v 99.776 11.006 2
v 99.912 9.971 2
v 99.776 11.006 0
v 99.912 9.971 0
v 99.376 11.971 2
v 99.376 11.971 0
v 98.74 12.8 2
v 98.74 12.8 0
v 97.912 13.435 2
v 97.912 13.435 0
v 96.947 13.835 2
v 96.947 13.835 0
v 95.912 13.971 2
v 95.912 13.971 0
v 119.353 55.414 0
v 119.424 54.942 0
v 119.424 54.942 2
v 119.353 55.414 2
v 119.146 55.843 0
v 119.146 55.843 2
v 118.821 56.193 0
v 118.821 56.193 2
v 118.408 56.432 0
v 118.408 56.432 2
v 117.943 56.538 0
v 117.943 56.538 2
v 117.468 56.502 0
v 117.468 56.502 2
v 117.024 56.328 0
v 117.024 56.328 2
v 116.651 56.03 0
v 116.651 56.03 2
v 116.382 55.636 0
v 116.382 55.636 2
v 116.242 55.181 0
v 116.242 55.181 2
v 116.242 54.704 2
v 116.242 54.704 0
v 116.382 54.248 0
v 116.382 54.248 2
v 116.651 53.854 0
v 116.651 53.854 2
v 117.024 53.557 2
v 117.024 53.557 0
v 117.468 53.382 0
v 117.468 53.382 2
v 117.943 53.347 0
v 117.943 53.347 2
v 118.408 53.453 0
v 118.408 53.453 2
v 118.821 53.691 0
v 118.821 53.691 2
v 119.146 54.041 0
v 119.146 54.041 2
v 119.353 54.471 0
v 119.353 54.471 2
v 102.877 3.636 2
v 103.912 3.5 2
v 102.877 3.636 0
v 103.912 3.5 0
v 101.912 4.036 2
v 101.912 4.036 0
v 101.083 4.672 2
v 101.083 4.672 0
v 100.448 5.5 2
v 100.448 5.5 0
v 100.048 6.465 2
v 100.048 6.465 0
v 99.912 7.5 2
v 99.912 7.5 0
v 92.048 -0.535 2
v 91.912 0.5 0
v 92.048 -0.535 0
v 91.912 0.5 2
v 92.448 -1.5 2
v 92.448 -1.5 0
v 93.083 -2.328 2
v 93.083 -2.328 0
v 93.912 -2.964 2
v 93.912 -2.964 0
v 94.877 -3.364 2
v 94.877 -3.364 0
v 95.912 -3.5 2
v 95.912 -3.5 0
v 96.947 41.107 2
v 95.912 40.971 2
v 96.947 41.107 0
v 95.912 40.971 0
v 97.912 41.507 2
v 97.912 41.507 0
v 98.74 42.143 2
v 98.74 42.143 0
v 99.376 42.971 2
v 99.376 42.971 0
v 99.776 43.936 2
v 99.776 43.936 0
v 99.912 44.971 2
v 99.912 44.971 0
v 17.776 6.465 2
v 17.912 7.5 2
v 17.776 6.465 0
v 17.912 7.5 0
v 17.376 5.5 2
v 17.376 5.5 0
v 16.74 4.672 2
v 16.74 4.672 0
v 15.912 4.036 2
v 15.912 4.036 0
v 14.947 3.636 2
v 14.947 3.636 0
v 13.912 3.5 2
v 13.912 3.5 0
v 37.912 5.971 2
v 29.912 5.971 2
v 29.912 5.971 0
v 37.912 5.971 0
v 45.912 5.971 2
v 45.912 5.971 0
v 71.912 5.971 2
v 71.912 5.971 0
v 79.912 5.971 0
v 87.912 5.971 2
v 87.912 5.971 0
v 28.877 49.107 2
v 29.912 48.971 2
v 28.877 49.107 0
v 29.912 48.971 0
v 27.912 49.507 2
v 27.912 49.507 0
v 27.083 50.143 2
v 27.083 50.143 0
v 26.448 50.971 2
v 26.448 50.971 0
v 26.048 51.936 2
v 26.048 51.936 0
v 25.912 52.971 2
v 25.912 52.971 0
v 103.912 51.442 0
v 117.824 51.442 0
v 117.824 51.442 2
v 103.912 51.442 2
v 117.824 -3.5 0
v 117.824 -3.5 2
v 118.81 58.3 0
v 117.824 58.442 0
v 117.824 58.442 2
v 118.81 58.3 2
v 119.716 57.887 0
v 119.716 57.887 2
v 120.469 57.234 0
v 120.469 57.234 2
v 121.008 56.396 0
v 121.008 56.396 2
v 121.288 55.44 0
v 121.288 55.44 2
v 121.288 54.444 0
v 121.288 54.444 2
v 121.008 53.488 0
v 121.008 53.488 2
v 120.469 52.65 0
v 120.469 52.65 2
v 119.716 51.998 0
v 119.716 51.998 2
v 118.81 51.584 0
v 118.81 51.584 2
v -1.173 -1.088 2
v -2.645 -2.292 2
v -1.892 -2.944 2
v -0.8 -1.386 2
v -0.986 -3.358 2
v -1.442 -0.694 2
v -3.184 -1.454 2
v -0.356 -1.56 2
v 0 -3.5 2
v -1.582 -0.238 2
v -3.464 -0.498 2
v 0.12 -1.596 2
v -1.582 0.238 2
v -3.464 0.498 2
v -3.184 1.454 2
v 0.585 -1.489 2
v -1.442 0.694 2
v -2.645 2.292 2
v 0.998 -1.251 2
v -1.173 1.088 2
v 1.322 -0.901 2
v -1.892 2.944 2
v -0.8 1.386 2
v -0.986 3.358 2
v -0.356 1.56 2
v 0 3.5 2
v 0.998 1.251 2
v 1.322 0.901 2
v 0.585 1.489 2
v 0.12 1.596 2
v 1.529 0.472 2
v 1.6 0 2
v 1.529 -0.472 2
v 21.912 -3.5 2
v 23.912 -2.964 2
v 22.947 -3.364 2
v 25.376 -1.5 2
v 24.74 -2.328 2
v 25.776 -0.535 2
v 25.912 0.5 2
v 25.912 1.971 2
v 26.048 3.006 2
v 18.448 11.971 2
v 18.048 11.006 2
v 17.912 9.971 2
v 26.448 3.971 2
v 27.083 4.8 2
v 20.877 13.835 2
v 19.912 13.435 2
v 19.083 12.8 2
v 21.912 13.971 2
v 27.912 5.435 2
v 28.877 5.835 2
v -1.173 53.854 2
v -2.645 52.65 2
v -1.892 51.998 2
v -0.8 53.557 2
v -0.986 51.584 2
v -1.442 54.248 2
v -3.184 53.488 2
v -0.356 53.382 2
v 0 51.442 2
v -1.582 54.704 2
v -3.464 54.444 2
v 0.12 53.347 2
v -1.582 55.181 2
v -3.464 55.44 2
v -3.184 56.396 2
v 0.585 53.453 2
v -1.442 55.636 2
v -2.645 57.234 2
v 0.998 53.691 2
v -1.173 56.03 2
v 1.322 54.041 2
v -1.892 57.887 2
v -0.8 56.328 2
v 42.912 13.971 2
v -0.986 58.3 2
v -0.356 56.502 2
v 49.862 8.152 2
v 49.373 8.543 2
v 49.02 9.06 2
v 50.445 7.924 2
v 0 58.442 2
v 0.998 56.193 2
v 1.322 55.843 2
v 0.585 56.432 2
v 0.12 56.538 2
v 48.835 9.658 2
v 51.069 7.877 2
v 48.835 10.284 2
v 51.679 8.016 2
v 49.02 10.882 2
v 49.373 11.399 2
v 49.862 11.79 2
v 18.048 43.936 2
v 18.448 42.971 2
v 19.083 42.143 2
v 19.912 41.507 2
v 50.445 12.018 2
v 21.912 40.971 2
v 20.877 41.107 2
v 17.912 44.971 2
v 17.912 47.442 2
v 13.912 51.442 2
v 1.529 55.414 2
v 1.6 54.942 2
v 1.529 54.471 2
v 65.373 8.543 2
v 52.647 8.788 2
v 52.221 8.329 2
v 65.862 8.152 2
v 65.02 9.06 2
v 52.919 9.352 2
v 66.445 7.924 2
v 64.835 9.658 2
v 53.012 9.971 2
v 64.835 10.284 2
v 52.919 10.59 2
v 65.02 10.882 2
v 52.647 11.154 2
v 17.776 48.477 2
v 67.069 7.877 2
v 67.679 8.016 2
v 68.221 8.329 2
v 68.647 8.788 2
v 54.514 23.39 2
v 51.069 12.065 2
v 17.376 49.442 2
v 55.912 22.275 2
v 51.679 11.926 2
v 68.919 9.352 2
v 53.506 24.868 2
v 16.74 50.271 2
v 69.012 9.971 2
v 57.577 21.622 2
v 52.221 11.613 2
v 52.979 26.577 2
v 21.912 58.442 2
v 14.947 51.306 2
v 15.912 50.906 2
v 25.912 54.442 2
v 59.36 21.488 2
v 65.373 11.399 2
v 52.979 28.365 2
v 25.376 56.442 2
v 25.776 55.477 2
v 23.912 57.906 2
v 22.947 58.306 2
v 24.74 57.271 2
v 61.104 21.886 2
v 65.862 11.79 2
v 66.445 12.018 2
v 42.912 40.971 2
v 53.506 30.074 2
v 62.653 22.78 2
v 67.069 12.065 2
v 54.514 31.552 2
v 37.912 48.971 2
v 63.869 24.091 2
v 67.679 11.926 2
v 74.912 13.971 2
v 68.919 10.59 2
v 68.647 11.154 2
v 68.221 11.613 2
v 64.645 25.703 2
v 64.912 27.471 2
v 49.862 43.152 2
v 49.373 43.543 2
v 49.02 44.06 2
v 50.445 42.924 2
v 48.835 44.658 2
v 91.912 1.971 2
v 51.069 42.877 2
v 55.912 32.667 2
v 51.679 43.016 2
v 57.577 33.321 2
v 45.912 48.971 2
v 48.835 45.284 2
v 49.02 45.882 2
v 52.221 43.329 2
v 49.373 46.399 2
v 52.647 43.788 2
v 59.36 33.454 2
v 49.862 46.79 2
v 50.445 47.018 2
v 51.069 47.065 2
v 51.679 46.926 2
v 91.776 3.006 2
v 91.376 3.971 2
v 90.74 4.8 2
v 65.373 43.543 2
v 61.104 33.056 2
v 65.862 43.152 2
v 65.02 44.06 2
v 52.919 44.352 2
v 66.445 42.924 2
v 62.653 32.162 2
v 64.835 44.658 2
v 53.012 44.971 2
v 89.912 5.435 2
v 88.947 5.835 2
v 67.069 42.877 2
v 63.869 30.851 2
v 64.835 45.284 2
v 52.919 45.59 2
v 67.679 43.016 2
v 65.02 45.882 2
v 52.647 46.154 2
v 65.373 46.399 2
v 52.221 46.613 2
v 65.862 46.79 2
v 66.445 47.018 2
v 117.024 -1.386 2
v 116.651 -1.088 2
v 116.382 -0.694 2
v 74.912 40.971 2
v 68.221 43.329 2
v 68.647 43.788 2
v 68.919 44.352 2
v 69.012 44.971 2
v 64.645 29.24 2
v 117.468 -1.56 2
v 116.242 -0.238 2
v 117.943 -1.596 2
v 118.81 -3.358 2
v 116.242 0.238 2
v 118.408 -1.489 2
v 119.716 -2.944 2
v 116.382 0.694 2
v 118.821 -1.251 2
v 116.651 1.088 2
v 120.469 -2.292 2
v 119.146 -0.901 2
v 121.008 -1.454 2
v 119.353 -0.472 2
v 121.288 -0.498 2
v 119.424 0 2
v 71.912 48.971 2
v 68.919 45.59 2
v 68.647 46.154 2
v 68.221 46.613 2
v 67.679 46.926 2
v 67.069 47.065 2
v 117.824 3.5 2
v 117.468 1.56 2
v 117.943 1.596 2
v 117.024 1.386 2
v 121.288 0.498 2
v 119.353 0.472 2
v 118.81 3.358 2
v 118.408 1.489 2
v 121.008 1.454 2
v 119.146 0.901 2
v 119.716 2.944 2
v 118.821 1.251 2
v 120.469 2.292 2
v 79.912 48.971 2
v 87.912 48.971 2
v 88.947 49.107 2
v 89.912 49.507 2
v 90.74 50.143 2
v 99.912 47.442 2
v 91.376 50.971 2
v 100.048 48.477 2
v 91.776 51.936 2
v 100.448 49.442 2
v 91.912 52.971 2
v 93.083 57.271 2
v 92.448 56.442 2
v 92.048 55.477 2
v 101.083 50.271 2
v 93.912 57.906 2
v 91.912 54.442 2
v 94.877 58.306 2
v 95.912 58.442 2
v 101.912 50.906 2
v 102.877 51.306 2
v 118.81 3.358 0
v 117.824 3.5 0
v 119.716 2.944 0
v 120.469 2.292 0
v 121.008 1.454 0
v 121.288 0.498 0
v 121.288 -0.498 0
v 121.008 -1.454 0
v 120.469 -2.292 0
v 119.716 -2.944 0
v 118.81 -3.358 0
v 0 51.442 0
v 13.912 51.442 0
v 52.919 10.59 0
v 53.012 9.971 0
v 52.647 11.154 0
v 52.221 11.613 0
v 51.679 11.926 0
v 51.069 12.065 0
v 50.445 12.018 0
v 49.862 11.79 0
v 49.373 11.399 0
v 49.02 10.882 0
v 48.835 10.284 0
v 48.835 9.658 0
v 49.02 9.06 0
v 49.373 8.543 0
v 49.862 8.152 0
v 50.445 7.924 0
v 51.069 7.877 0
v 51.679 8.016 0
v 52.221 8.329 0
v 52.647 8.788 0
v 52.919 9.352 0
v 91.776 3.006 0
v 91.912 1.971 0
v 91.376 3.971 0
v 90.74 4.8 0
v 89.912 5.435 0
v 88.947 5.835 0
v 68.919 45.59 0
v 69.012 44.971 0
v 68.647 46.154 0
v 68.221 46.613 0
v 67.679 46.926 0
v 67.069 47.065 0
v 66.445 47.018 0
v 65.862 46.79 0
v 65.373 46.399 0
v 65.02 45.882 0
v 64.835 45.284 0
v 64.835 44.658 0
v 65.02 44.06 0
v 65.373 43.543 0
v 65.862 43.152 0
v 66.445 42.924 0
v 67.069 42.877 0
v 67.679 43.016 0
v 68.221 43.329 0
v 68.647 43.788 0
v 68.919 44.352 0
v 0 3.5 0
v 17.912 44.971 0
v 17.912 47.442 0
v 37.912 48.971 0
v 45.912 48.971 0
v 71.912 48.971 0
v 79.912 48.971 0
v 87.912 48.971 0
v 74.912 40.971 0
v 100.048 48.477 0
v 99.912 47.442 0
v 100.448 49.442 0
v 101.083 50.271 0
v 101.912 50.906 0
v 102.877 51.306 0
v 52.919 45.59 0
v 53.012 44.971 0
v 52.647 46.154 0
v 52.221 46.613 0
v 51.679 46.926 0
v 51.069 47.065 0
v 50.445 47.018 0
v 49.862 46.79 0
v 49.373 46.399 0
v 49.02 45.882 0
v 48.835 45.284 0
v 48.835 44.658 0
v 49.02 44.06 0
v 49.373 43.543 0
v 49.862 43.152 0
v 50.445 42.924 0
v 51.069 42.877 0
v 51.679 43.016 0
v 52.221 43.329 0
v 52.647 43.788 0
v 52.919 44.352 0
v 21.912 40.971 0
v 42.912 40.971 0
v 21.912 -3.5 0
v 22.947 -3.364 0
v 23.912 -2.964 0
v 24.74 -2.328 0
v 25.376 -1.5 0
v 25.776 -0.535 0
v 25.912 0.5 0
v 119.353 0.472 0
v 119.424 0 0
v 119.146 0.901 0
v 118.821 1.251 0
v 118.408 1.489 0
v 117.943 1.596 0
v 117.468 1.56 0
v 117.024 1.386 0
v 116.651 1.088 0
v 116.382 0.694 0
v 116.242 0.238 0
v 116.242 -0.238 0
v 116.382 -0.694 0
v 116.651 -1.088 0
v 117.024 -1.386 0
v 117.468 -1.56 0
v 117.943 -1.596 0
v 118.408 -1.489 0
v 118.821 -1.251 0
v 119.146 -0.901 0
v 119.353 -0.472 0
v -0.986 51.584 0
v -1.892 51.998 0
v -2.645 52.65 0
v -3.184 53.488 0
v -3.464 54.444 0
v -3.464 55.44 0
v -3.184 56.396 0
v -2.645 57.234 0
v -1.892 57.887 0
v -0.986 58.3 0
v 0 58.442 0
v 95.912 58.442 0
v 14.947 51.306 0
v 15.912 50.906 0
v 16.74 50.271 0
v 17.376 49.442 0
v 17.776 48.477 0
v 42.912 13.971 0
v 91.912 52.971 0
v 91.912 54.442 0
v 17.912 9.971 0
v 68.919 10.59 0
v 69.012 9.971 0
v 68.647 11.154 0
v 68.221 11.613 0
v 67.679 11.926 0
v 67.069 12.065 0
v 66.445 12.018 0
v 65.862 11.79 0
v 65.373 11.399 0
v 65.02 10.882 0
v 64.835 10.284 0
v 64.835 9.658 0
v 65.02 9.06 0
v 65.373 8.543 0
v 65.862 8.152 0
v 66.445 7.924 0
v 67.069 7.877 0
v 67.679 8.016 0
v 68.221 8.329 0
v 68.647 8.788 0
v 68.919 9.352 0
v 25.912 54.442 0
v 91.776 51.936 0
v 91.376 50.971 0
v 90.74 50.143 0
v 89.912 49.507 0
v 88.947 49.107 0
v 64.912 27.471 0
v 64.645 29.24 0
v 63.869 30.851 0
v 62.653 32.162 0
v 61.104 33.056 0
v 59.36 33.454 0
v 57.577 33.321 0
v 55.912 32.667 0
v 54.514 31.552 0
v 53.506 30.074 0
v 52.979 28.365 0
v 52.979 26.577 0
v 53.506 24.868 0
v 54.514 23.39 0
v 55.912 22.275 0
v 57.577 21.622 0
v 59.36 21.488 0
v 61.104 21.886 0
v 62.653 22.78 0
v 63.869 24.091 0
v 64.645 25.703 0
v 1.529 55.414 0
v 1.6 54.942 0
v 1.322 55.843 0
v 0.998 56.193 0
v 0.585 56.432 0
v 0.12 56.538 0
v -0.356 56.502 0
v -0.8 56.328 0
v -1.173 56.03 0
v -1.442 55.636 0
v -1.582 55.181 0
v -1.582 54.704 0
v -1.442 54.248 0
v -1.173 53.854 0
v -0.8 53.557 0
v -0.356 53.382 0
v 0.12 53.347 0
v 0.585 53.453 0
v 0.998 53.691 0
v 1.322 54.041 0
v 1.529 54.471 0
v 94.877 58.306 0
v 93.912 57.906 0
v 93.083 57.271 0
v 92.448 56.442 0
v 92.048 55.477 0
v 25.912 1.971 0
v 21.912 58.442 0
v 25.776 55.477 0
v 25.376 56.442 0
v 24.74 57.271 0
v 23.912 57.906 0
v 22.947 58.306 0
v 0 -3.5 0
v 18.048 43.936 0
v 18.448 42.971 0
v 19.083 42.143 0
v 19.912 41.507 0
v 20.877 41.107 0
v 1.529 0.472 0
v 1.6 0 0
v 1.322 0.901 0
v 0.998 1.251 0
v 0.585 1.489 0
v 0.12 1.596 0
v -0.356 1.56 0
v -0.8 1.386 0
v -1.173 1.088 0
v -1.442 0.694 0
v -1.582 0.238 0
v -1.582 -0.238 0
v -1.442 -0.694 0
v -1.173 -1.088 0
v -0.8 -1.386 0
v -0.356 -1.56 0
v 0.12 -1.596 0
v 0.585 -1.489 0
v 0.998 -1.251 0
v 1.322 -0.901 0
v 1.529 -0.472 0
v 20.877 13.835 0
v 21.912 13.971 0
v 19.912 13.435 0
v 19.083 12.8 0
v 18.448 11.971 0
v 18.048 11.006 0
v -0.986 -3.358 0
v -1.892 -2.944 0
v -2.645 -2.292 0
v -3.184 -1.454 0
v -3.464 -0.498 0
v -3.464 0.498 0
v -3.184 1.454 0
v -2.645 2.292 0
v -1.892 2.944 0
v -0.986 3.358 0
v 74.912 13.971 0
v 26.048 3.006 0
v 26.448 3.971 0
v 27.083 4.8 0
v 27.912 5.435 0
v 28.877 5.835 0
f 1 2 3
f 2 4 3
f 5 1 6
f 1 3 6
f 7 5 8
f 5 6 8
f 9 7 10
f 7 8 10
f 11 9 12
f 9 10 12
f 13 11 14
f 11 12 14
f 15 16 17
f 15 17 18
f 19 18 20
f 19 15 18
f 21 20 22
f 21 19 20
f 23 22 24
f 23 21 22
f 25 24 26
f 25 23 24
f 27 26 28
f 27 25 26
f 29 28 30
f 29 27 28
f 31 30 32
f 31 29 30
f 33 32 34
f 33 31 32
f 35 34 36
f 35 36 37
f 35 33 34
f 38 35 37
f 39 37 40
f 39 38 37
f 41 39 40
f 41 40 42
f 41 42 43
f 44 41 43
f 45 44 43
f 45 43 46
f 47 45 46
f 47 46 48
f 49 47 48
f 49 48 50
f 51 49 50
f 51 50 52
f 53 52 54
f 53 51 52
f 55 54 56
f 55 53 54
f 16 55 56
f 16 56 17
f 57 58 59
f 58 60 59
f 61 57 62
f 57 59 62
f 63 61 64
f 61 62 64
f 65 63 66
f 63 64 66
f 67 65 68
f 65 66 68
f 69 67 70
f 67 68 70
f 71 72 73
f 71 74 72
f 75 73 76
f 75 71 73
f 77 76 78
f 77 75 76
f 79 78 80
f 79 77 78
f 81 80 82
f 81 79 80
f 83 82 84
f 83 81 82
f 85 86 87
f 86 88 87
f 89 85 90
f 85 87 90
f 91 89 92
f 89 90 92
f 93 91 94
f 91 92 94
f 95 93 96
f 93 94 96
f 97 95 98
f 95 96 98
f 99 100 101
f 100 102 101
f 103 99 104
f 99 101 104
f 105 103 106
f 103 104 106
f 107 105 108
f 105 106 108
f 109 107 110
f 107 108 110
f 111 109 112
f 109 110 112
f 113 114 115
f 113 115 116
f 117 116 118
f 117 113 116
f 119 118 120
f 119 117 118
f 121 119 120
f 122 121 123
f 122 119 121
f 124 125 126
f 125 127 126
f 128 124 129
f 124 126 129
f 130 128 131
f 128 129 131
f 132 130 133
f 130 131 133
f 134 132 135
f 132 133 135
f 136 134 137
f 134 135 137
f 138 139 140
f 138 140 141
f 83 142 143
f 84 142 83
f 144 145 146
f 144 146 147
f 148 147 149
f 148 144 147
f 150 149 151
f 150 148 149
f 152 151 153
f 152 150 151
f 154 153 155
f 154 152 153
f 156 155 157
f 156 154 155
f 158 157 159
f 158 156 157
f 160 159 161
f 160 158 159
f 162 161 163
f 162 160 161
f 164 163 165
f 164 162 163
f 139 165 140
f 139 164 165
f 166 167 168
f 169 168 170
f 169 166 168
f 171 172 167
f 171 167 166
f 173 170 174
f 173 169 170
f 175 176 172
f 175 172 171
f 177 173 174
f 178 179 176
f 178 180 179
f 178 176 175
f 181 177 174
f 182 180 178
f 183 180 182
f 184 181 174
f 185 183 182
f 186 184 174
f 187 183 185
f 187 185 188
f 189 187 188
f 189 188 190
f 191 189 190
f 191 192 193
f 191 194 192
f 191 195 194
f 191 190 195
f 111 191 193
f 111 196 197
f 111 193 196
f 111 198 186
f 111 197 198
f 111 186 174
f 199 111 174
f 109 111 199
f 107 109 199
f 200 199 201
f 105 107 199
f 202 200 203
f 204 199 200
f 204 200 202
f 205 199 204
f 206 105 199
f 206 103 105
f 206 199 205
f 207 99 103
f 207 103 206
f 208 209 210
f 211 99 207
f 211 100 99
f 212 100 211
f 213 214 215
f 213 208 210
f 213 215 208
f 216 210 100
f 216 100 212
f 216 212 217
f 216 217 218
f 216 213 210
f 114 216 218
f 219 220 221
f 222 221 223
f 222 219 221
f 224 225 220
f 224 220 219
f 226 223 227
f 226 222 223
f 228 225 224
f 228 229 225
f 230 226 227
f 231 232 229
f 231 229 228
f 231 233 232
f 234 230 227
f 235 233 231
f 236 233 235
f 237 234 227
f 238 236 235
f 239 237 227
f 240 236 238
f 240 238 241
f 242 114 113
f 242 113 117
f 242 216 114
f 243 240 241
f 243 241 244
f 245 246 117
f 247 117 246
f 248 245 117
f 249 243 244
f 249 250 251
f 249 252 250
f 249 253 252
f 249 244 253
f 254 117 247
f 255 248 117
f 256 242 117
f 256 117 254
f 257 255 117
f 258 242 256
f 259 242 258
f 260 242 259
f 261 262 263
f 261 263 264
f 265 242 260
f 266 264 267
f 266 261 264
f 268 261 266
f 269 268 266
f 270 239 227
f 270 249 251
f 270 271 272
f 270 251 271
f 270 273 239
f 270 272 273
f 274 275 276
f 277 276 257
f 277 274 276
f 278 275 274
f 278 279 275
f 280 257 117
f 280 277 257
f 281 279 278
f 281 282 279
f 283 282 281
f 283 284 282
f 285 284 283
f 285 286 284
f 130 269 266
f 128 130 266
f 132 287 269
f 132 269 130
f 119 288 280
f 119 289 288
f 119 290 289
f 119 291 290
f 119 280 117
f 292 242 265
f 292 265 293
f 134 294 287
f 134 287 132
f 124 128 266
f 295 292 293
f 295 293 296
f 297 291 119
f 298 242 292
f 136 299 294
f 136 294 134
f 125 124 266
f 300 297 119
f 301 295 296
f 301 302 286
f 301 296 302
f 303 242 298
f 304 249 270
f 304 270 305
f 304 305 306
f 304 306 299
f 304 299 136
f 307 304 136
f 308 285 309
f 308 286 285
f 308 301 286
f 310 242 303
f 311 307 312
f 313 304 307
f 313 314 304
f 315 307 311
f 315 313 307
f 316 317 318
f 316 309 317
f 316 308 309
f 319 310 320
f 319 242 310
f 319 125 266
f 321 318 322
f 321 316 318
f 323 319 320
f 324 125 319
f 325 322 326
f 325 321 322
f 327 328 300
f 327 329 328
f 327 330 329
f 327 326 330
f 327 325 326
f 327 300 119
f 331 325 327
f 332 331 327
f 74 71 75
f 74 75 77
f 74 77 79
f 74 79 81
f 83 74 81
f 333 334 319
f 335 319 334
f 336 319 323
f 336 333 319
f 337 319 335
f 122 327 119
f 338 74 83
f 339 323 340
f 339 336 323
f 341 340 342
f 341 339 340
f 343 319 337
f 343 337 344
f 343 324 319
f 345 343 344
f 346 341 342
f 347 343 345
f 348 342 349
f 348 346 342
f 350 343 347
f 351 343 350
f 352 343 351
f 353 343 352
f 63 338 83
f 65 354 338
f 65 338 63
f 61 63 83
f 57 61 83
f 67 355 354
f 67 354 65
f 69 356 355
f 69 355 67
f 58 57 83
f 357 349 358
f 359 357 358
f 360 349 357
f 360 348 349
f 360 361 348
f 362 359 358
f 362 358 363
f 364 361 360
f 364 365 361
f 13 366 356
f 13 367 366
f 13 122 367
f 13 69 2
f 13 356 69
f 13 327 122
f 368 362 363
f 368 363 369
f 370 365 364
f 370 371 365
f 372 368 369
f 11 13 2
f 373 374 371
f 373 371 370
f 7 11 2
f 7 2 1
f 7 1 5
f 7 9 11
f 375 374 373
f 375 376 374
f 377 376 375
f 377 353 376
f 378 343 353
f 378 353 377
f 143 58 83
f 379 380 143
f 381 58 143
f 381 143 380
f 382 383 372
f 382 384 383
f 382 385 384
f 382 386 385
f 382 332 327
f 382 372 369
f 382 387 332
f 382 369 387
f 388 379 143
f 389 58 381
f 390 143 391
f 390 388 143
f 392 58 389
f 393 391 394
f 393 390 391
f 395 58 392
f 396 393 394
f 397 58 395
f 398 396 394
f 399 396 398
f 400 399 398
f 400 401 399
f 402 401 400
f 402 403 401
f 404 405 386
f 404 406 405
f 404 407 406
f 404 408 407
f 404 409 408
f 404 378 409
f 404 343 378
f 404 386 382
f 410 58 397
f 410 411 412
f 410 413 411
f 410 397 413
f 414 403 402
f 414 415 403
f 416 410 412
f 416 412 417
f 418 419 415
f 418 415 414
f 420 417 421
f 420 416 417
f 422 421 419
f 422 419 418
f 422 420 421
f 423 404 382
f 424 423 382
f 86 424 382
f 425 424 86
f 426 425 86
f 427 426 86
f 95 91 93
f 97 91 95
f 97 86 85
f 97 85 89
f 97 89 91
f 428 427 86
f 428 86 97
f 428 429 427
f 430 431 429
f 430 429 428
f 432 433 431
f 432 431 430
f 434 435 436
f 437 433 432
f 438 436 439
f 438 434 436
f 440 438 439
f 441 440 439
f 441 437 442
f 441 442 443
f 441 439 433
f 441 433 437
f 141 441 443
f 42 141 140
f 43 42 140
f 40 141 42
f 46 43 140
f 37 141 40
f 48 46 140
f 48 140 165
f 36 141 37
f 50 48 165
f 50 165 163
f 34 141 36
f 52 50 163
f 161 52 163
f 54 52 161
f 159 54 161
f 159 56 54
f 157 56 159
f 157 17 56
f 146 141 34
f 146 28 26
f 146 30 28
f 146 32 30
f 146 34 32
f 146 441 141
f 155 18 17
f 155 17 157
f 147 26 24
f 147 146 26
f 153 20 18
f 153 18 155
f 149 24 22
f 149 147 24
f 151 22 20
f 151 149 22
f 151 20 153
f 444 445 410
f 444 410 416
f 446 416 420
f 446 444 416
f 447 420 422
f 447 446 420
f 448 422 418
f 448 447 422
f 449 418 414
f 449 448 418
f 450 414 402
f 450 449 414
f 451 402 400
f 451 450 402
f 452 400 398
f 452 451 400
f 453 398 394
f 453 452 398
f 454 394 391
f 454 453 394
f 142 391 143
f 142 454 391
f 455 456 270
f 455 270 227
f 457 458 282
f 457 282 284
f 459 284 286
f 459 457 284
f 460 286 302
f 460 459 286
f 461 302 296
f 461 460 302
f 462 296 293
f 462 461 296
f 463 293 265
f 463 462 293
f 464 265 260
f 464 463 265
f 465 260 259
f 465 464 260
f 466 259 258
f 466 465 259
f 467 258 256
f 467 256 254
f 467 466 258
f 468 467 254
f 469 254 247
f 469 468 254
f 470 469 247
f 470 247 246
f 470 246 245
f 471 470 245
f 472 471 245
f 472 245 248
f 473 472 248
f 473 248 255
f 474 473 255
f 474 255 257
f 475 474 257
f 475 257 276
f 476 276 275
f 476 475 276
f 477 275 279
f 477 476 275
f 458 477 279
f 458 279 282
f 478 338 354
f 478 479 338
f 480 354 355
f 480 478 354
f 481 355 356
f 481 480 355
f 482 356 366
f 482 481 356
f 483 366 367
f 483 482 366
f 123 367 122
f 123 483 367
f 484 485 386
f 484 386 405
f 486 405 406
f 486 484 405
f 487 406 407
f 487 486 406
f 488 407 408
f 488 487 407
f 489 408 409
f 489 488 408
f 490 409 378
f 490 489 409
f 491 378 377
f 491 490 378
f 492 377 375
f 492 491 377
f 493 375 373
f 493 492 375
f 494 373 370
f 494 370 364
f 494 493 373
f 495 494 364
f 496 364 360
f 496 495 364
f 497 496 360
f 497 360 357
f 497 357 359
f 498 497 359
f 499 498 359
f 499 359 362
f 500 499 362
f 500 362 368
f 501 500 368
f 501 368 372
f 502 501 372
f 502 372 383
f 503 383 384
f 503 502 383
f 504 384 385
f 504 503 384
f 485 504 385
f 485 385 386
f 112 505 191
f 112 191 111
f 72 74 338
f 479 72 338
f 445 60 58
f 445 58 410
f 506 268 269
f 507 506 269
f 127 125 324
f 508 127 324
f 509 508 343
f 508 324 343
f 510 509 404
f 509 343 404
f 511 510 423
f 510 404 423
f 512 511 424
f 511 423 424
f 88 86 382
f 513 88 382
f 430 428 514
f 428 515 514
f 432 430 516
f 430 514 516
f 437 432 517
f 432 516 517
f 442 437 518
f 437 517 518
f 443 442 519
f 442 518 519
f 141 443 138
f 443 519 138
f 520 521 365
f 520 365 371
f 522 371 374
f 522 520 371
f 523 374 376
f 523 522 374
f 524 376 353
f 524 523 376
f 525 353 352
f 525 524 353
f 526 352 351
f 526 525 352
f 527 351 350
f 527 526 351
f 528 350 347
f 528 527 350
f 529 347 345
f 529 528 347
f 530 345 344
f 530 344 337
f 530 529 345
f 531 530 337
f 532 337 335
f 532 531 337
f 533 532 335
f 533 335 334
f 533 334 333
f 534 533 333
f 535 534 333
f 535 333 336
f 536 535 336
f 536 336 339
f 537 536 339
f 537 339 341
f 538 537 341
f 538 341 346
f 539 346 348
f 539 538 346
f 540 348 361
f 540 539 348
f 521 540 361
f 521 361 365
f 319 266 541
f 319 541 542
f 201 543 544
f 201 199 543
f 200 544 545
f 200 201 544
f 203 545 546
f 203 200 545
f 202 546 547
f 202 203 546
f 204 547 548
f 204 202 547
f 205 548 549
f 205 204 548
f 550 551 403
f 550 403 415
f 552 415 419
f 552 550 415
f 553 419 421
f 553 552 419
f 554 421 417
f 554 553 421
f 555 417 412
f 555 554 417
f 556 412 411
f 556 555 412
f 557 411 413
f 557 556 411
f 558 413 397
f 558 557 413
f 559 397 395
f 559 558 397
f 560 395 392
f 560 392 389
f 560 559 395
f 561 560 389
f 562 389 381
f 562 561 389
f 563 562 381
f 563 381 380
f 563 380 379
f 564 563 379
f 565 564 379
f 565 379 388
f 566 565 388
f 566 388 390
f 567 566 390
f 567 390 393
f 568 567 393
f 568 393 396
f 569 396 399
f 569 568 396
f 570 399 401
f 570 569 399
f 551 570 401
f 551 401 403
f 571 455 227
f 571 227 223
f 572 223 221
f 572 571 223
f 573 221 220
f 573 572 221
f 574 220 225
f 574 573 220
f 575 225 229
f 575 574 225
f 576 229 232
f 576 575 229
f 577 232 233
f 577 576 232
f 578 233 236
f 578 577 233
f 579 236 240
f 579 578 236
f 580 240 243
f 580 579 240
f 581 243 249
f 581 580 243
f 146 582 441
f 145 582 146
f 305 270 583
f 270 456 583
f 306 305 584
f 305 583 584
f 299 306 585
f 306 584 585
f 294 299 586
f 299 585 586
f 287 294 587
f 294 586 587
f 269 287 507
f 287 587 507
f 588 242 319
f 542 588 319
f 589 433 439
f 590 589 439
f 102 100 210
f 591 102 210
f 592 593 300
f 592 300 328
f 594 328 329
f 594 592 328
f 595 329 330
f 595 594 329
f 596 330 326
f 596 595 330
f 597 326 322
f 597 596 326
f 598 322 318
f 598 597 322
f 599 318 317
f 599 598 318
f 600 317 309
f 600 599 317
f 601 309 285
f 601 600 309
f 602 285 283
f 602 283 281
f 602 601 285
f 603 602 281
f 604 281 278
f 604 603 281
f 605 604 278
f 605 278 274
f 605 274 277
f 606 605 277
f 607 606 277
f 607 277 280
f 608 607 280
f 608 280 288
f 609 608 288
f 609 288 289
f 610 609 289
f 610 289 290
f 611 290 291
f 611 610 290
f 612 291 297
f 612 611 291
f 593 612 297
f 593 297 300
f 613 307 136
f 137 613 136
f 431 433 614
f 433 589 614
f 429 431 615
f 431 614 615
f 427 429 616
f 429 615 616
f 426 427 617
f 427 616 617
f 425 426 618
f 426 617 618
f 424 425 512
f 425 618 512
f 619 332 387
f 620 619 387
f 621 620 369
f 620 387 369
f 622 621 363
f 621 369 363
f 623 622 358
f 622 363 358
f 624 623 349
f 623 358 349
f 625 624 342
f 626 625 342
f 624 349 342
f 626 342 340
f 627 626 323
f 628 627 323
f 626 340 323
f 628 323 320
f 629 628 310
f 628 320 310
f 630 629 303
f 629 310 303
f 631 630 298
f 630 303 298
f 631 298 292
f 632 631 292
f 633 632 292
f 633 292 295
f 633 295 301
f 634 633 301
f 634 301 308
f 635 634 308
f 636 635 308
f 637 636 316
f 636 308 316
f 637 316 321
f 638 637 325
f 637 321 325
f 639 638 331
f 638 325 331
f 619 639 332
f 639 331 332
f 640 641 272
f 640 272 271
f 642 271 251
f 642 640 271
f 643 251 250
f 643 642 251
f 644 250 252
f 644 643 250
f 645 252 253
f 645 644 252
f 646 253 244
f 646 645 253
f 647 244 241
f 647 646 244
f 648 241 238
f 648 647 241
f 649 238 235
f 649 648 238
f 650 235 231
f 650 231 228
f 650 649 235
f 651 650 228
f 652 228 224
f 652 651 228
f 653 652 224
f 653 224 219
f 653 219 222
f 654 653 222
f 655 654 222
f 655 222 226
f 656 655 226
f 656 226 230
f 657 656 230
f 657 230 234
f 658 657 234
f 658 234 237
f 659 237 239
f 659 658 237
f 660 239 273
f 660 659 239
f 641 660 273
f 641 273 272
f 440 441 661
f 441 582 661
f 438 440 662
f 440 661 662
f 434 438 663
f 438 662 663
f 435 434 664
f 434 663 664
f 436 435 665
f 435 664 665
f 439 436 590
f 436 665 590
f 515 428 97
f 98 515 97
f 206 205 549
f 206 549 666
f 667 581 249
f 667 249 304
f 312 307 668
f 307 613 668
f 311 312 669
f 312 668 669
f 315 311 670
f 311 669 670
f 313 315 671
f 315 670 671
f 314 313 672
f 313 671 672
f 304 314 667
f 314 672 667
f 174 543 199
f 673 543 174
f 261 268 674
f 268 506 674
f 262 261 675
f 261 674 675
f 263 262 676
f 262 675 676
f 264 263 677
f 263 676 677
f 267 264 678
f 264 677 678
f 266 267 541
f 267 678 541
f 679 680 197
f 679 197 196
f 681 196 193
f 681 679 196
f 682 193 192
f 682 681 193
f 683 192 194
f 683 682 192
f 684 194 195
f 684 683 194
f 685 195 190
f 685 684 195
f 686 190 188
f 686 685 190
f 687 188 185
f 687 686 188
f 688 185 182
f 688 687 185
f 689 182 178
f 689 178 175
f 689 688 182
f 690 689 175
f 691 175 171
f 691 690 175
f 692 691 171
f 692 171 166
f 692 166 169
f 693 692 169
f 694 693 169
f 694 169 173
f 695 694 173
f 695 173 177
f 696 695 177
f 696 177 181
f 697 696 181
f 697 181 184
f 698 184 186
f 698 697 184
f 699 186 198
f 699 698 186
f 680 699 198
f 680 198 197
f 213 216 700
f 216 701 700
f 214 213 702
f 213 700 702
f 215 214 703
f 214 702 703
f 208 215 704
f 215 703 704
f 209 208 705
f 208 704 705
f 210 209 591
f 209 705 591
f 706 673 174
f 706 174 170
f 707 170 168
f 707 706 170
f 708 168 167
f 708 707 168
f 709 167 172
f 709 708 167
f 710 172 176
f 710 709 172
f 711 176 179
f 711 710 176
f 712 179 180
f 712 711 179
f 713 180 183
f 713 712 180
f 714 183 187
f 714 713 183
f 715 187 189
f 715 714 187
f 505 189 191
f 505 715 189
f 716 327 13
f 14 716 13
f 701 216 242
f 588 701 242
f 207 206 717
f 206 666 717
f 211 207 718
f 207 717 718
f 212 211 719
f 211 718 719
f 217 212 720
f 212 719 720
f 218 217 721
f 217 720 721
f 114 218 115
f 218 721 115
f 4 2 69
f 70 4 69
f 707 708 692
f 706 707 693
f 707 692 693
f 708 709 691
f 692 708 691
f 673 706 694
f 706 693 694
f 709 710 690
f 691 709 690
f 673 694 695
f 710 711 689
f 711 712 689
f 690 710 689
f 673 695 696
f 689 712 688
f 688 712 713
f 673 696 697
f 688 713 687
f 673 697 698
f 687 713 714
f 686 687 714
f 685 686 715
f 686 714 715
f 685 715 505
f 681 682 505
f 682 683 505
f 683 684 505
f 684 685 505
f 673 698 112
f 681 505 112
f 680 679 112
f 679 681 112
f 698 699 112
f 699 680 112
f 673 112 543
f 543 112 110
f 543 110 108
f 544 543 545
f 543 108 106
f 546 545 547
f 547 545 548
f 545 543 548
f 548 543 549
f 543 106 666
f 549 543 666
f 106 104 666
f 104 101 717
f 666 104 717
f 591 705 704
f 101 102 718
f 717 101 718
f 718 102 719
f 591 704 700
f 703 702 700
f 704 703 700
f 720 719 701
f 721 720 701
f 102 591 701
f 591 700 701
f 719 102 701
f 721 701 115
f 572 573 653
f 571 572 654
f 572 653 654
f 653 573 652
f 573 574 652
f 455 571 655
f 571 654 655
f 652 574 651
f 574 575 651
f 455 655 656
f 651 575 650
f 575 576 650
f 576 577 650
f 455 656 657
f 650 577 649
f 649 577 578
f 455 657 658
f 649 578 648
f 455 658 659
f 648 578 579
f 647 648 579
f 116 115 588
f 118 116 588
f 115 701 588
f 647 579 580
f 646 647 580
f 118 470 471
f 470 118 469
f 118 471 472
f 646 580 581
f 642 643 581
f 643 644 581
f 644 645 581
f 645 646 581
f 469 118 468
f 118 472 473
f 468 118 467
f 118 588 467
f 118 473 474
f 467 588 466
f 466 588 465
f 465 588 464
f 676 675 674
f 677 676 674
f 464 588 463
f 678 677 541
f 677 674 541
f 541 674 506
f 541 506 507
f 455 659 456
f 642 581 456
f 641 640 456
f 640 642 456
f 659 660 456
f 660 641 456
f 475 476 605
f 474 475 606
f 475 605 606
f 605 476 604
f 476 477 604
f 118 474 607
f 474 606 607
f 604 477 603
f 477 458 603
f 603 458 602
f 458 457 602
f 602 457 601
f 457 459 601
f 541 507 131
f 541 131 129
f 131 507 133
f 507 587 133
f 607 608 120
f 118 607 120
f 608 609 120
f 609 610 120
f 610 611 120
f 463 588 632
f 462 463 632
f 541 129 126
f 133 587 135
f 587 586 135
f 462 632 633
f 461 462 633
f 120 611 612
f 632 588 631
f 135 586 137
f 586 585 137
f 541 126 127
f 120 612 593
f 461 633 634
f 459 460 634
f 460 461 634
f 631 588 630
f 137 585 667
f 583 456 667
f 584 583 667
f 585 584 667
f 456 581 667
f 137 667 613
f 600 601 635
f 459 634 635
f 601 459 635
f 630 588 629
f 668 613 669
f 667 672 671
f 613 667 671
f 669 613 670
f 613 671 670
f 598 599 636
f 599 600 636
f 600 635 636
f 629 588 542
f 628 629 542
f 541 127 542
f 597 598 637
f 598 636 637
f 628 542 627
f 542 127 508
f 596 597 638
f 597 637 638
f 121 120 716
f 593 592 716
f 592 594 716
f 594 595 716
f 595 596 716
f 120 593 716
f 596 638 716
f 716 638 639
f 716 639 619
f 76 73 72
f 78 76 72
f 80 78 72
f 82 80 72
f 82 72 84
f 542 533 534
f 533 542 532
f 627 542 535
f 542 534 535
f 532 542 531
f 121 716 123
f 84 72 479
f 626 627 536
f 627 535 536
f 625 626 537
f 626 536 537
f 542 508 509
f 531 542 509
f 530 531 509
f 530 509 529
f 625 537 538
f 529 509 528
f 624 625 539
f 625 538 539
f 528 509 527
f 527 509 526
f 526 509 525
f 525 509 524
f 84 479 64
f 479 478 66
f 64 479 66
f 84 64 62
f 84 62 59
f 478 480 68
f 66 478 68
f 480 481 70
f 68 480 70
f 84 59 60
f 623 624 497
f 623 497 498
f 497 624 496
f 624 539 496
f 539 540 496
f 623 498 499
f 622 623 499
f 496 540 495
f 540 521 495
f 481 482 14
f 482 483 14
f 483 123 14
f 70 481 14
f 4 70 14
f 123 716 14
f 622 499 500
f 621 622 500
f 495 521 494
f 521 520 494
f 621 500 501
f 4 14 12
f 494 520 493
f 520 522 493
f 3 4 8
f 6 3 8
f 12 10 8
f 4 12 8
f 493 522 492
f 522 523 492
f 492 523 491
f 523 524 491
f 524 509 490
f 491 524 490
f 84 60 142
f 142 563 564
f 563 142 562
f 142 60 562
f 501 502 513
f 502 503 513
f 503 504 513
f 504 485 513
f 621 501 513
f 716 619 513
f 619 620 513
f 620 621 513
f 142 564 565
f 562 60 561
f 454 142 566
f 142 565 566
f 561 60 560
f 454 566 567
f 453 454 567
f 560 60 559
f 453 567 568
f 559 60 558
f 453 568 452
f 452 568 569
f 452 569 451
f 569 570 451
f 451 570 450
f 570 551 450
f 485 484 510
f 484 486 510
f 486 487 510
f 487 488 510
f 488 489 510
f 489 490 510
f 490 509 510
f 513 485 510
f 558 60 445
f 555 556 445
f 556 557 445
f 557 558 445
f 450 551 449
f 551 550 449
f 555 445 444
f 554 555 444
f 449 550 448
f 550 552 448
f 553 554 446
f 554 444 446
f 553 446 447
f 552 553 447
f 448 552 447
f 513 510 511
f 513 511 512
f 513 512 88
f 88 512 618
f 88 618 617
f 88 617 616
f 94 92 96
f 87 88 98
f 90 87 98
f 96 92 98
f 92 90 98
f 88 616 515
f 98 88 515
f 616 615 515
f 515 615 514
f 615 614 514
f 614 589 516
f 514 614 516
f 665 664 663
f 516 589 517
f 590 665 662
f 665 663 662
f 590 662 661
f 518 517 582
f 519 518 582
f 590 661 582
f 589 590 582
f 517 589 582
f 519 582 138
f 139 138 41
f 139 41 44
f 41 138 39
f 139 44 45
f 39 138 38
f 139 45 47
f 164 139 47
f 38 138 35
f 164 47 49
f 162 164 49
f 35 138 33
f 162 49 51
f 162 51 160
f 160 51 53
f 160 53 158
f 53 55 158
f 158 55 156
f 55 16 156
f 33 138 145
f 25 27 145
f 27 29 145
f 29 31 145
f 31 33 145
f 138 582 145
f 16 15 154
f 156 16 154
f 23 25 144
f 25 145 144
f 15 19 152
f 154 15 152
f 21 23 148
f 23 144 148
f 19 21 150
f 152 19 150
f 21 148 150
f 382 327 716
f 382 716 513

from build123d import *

# Parameters (mm, degrees)
SKETCH1_R           = 1.6
SKETCH1_R_2         = 2.1
BOSS_EXTRUDE3_DEPTH = 2
BOSS_EXTRUDE4_DEPTH = 2
SKETCH4_W           = 66
SKETCH4_H           = 16.340111315
SKETCH4_H_2         = 24.741581589
CUT_EXTRUDE3_DEPTH  = 14.5
FILLET1_R           = 4
SKETCH5_W           = 26
SKETCH5_H           = 27
SKETCH5_R           = 6
BOSS_EXTRUDE5_DEPTH = 2
SKETCH6_W           = 5
SKETCH6_H           = 27
CUT_EXTRUDE4_DEPTH  = 14.5


with BuildPart() as part:
    # Sketch1 → Boss-Extrude3 (new body)
    with BuildSketch(Plane.XY):
        with BuildLine():
            Line((0, 3.5), (37.911912125, 3.5))
            Line((37.911912125, 3.5), (37.911912125, 13.97107578))
            Line((37.911912125, 13.97107578), (37.911912125, 40.97107578))
            Line((37.911912125, 40.97107578), (37.911912125, 51.44215156))
            Line((37.911912125, 51.44215156), (0, 51.44215156))
            ThreePointArc((0, 51.44215156), (-3.5, 54.94215156), (0, 58.44215156))
            Line((0, 58.44215156), (45.911912125, 58.44215156))
            Line((45.911912125, 58.44215156), (45.911912125, 51.44215156))
            Line((45.911912125, 51.44215156), (45.911912125, 48.97107578))
            Line((45.911912125, 48.97107578), (50.911912125, 48.97107578))
            Line((50.911912125, 48.97107578), (66.911912125, 48.97107578))
            Line((66.911912125, 48.97107578), (71.911912125, 48.97107578))
            Line((71.911912125, 48.97107578), (71.911912125, 51.44215156))
            Line((71.911912125, 51.44215156), (71.911912125, 58.44215156))
            Line((71.911912125, 58.44215156), (117.82382425, 58.44215156))
            ThreePointArc((117.82382425, 58.44215156), (121.32382425, 54.94215156), (117.82382425, 51.44215156))
            Line((117.82382425, 51.44215156), (79.911912125, 51.44215156))
            Line((79.911912125, 51.44215156), (79.911912125, 40.97107578))
            Line((79.911912125, 40.97107578), (79.911912125, 13.97107578))
            Line((79.911912125, 13.97107578), (79.911912125, 3.5))
            Line((79.911912125, 3.5), (117.82382425, 3.5))
            ThreePointArc((117.82382425, 3.5), (121.32382425, 0), (117.82382425, -3.5))
            Line((117.82382425, -3.5), (71.911912125, -3.5))
            Line((71.911912125, -3.5), (71.911912125, 3.5))
            Line((71.911912125, 3.5), (71.911912125, 5.97107578))
            Line((71.911912125, 5.97107578), (66.911912125, 5.97107578))
            Line((66.911912125, 5.97107578), (50.911912125, 5.97107578))
            Line((50.911912125, 5.97107578), (45.911912125, 5.97107578))
            Line((45.911912125, 5.97107578), (45.911912125, 3.5))
            Line((45.911912125, 3.5), (45.911912125, -3.5))
            Line((45.911912125, -3.5), (0, -3.5))
            ThreePointArc((0, -3.5), (-3.5, 0), (0, 3.5))
        make_face()
        with Locations((0, 54.94215156)):
            Circle(SKETCH1_R, mode=Mode.SUBTRACT)
        with Locations((117.82382425, 54.94215156)):
            Circle(SKETCH1_R, mode=Mode.SUBTRACT)
        with Locations((117.82382425, 0)):
            Circle(SKETCH1_R, mode=Mode.SUBTRACT)
        Circle(SKETCH1_R, mode=Mode.SUBTRACT)
        with Locations((66.911912125, 44.97107578)):
            Circle(SKETCH1_R_2, mode=Mode.SUBTRACT)
        with Locations((66.911912125, 9.97107578)):
            Circle(SKETCH1_R_2, mode=Mode.SUBTRACT)
        with Locations((50.911912125, 9.97107578)):
            Circle(SKETCH1_R_2, mode=Mode.SUBTRACT)
        with Locations((50.911912125, 44.97107578)):
            Circle(SKETCH1_R_2, mode=Mode.SUBTRACT)
        Polygon((66.911912125, 40.97107578), (50.911912125, 40.97107578), (45.911912125, 40.97107578), (45.911912125, 27.47107578), (45.911912125, 13.97107578), (50.911912125, 13.97107578), (66.911912125, 13.97107578), (71.911912125, 13.97107578), (71.911912125, 27.47107578), (71.911912125, 40.97107578), align=None, mode=Mode.SUBTRACT)
    extrude(amount=BOSS_EXTRUDE3_DEPTH)

    # Sketch3 → Boss-Extrude4 (add)
    with BuildSketch(Plane.XY.offset(2)):
        Polygon((71.911912125, 13.97107578), (99.911912125, 13.97107578), (99.911912125, 3.5), (91.911912125, 3.5), (91.911912125, 5.97107578), (71.911912125, 5.97107578), align=None)
        Polygon((91.911912125, 51.44215156), (99.911912125, 51.44215156), (99.911912125, 40.97107578), (71.911912125, 40.97107578), (71.911912125, 48.97107578), (91.911912125, 48.97107578), align=None)
        Polygon((45.911912125, 40.97107578), (17.911912125, 40.97107578), (17.911912125, 51.44215156), (25.911912125, 51.44215156), (25.911912125, 48.97107578), (45.911912125, 48.97107578), align=None)
        Polygon((25.911912125, 3.5), (17.911912125, 3.5), (17.911912125, 13.97107578), (45.911912125, 13.97107578), (45.911912125, 5.97107578), (25.911912125, 5.97107578), align=None)
    extrude(amount=-BOSS_EXTRUDE4_DEPTH)

    # Sketch4 → Cut-Extrude3 (cut)
    with BuildSketch(Plane.XY.offset(2)):
        with Locations((58.911912125, 57.141131438)):
            Rectangle(SKETCH4_W, SKETCH4_H)
        with Locations((58.911912125, -6.399715014)):
            Rectangle(SKETCH4_W, SKETCH4_H_2)
    extrude(amount=-CUT_EXTRUDE3_DEPTH, mode=Mode.SUBTRACT)

    # Fillet1
    fillet1_edges = [part.edges().sort_by_distance(p)[0] for p in [
        (99.911912125, 13.97107578, 1),
        (99.911912125, 3.5, 1),
        (91.911912125, 5.97107578, 1),
        (91.911912125, 48.97107578, 1),
        (99.911912125, 51.44215156, 1),
        (99.911912125, 40.97107578, 1),
        (17.911912125, 40.97107578, 1),
        (17.911912125, 51.44215156, 1),
        (25.911912125, 48.97107578, 1),
        (25.911912125, 5.97107578, 1),
        (17.911912125, 3.5, 1),
        (17.911912125, 13.97107578, 1),
        (91.911912125, 58.44215156, 1),
        (25.911912125, 58.44215156, 1),
        (91.911912125, -3.5, 1),
        (25.911912125, -3.5, 1),
    ]]
    fillet(fillet1_edges, radius=FILLET1_R)

    # Sketch5 → Boss-Extrude5 (add)
    with BuildSketch(Plane.XY.offset(2)):
        with Locations((58.911912125, 27.47107578)):
            Rectangle(SKETCH5_W, SKETCH5_H)
        with Locations((58.911912125, 27.47107578)):
            Circle(SKETCH5_R, mode=Mode.SUBTRACT)
    extrude(amount=-BOSS_EXTRUDE5_DEPTH)

    # Sketch6 → Cut-Extrude4 (cut)
    with BuildSketch(Plane.XY.offset(2)):
        with Locations((40.411912125, 27.47107578)):
            Rectangle(SKETCH6_W, SKETCH6_H)
        with Locations((77.411912125, 27.47107578)):
            Rectangle(SKETCH6_W, SKETCH6_H)
    extrude(amount=-CUT_EXTRUDE4_DEPTH, mode=Mode.SUBTRACT)


solid = part.part
